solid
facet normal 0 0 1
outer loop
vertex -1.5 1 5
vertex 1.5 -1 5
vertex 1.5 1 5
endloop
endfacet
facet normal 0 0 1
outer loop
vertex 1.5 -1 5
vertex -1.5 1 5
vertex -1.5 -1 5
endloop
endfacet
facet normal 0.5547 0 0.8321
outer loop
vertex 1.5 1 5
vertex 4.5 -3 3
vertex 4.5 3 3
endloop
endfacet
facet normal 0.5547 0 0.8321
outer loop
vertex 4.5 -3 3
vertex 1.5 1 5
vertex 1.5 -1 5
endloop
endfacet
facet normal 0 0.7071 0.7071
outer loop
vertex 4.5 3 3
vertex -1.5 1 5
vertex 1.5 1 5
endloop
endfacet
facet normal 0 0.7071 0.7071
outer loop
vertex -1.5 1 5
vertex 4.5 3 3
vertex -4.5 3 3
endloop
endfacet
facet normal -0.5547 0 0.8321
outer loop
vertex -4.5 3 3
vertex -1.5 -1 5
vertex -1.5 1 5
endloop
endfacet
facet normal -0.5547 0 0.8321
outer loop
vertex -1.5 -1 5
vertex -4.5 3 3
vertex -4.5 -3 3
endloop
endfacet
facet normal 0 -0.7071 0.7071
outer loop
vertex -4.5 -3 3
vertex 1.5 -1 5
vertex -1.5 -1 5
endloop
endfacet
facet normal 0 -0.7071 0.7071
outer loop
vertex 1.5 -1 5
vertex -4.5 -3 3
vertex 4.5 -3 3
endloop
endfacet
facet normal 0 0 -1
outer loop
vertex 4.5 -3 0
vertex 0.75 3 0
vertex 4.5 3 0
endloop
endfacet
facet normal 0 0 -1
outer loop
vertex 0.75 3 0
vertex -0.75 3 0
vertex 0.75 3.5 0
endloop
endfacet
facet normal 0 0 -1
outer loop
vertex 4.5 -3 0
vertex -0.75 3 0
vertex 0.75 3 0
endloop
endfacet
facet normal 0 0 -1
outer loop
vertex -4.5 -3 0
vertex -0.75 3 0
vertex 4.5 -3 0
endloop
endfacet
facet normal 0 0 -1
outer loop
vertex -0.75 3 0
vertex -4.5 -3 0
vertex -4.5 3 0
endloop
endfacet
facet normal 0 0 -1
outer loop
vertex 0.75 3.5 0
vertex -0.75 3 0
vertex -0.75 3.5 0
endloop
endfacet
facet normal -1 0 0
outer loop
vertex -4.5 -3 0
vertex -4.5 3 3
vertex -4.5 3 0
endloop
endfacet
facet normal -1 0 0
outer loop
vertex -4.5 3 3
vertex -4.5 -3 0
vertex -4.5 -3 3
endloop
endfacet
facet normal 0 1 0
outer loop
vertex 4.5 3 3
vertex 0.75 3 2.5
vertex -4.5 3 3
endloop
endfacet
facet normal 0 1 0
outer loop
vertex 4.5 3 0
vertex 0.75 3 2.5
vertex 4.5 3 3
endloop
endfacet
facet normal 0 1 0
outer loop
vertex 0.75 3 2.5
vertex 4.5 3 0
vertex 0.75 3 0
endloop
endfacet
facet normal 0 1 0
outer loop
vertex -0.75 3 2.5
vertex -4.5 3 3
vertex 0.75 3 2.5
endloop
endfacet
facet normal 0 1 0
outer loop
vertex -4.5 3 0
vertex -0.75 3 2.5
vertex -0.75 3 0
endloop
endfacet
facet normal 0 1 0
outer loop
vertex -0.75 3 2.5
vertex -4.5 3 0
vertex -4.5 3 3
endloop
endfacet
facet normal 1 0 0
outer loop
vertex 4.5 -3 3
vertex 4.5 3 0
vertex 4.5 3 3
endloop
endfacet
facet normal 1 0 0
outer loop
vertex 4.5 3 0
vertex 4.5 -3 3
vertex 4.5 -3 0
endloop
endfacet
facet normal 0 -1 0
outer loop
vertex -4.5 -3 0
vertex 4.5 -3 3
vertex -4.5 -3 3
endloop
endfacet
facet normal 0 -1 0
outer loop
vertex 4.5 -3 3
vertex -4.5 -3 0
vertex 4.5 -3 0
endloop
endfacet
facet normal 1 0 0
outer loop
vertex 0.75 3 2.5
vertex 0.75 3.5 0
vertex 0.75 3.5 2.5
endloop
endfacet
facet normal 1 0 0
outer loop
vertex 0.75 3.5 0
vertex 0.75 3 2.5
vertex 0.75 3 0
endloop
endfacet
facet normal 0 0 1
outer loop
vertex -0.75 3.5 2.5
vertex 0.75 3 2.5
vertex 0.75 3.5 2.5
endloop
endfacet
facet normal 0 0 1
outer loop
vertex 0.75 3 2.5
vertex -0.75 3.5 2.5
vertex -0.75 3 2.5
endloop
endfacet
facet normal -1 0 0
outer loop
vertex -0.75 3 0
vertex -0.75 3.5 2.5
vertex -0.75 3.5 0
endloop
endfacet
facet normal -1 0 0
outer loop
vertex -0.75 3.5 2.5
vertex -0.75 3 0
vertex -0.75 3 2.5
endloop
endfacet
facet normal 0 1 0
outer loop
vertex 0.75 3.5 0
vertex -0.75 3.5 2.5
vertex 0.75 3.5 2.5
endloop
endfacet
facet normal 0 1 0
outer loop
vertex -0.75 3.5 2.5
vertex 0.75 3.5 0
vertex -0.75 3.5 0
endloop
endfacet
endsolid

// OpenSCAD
translate([0,0,5]) {
	rotate(a=[0,180,0]) {
		color("red")
		linear_extrude(height = 2, scale=3) 
		square ([3,2],center = true);
	}
};

translate([0,0,0]) {
	color("gray")
	linear_extrude(height = 3)
	square ([9,6],center = true);
};

translate([-0.75,3,0]) {
	cube([1.5,0.5,2.5]);
};


translate([2.5,3,1]) {
	rotate(a=[90,0,0]) {
		polygon(points=[[0,0],[0,1],[0.5,1.5],[1,1],[1,0]]);
	}
}

translate([-3,3,1]) {
	rotate(a=[90,0,0]) {
		polygon(points=[[0,0],[0,1],[0.5,1.5],[1,1],[1,0]]);
	}
}
